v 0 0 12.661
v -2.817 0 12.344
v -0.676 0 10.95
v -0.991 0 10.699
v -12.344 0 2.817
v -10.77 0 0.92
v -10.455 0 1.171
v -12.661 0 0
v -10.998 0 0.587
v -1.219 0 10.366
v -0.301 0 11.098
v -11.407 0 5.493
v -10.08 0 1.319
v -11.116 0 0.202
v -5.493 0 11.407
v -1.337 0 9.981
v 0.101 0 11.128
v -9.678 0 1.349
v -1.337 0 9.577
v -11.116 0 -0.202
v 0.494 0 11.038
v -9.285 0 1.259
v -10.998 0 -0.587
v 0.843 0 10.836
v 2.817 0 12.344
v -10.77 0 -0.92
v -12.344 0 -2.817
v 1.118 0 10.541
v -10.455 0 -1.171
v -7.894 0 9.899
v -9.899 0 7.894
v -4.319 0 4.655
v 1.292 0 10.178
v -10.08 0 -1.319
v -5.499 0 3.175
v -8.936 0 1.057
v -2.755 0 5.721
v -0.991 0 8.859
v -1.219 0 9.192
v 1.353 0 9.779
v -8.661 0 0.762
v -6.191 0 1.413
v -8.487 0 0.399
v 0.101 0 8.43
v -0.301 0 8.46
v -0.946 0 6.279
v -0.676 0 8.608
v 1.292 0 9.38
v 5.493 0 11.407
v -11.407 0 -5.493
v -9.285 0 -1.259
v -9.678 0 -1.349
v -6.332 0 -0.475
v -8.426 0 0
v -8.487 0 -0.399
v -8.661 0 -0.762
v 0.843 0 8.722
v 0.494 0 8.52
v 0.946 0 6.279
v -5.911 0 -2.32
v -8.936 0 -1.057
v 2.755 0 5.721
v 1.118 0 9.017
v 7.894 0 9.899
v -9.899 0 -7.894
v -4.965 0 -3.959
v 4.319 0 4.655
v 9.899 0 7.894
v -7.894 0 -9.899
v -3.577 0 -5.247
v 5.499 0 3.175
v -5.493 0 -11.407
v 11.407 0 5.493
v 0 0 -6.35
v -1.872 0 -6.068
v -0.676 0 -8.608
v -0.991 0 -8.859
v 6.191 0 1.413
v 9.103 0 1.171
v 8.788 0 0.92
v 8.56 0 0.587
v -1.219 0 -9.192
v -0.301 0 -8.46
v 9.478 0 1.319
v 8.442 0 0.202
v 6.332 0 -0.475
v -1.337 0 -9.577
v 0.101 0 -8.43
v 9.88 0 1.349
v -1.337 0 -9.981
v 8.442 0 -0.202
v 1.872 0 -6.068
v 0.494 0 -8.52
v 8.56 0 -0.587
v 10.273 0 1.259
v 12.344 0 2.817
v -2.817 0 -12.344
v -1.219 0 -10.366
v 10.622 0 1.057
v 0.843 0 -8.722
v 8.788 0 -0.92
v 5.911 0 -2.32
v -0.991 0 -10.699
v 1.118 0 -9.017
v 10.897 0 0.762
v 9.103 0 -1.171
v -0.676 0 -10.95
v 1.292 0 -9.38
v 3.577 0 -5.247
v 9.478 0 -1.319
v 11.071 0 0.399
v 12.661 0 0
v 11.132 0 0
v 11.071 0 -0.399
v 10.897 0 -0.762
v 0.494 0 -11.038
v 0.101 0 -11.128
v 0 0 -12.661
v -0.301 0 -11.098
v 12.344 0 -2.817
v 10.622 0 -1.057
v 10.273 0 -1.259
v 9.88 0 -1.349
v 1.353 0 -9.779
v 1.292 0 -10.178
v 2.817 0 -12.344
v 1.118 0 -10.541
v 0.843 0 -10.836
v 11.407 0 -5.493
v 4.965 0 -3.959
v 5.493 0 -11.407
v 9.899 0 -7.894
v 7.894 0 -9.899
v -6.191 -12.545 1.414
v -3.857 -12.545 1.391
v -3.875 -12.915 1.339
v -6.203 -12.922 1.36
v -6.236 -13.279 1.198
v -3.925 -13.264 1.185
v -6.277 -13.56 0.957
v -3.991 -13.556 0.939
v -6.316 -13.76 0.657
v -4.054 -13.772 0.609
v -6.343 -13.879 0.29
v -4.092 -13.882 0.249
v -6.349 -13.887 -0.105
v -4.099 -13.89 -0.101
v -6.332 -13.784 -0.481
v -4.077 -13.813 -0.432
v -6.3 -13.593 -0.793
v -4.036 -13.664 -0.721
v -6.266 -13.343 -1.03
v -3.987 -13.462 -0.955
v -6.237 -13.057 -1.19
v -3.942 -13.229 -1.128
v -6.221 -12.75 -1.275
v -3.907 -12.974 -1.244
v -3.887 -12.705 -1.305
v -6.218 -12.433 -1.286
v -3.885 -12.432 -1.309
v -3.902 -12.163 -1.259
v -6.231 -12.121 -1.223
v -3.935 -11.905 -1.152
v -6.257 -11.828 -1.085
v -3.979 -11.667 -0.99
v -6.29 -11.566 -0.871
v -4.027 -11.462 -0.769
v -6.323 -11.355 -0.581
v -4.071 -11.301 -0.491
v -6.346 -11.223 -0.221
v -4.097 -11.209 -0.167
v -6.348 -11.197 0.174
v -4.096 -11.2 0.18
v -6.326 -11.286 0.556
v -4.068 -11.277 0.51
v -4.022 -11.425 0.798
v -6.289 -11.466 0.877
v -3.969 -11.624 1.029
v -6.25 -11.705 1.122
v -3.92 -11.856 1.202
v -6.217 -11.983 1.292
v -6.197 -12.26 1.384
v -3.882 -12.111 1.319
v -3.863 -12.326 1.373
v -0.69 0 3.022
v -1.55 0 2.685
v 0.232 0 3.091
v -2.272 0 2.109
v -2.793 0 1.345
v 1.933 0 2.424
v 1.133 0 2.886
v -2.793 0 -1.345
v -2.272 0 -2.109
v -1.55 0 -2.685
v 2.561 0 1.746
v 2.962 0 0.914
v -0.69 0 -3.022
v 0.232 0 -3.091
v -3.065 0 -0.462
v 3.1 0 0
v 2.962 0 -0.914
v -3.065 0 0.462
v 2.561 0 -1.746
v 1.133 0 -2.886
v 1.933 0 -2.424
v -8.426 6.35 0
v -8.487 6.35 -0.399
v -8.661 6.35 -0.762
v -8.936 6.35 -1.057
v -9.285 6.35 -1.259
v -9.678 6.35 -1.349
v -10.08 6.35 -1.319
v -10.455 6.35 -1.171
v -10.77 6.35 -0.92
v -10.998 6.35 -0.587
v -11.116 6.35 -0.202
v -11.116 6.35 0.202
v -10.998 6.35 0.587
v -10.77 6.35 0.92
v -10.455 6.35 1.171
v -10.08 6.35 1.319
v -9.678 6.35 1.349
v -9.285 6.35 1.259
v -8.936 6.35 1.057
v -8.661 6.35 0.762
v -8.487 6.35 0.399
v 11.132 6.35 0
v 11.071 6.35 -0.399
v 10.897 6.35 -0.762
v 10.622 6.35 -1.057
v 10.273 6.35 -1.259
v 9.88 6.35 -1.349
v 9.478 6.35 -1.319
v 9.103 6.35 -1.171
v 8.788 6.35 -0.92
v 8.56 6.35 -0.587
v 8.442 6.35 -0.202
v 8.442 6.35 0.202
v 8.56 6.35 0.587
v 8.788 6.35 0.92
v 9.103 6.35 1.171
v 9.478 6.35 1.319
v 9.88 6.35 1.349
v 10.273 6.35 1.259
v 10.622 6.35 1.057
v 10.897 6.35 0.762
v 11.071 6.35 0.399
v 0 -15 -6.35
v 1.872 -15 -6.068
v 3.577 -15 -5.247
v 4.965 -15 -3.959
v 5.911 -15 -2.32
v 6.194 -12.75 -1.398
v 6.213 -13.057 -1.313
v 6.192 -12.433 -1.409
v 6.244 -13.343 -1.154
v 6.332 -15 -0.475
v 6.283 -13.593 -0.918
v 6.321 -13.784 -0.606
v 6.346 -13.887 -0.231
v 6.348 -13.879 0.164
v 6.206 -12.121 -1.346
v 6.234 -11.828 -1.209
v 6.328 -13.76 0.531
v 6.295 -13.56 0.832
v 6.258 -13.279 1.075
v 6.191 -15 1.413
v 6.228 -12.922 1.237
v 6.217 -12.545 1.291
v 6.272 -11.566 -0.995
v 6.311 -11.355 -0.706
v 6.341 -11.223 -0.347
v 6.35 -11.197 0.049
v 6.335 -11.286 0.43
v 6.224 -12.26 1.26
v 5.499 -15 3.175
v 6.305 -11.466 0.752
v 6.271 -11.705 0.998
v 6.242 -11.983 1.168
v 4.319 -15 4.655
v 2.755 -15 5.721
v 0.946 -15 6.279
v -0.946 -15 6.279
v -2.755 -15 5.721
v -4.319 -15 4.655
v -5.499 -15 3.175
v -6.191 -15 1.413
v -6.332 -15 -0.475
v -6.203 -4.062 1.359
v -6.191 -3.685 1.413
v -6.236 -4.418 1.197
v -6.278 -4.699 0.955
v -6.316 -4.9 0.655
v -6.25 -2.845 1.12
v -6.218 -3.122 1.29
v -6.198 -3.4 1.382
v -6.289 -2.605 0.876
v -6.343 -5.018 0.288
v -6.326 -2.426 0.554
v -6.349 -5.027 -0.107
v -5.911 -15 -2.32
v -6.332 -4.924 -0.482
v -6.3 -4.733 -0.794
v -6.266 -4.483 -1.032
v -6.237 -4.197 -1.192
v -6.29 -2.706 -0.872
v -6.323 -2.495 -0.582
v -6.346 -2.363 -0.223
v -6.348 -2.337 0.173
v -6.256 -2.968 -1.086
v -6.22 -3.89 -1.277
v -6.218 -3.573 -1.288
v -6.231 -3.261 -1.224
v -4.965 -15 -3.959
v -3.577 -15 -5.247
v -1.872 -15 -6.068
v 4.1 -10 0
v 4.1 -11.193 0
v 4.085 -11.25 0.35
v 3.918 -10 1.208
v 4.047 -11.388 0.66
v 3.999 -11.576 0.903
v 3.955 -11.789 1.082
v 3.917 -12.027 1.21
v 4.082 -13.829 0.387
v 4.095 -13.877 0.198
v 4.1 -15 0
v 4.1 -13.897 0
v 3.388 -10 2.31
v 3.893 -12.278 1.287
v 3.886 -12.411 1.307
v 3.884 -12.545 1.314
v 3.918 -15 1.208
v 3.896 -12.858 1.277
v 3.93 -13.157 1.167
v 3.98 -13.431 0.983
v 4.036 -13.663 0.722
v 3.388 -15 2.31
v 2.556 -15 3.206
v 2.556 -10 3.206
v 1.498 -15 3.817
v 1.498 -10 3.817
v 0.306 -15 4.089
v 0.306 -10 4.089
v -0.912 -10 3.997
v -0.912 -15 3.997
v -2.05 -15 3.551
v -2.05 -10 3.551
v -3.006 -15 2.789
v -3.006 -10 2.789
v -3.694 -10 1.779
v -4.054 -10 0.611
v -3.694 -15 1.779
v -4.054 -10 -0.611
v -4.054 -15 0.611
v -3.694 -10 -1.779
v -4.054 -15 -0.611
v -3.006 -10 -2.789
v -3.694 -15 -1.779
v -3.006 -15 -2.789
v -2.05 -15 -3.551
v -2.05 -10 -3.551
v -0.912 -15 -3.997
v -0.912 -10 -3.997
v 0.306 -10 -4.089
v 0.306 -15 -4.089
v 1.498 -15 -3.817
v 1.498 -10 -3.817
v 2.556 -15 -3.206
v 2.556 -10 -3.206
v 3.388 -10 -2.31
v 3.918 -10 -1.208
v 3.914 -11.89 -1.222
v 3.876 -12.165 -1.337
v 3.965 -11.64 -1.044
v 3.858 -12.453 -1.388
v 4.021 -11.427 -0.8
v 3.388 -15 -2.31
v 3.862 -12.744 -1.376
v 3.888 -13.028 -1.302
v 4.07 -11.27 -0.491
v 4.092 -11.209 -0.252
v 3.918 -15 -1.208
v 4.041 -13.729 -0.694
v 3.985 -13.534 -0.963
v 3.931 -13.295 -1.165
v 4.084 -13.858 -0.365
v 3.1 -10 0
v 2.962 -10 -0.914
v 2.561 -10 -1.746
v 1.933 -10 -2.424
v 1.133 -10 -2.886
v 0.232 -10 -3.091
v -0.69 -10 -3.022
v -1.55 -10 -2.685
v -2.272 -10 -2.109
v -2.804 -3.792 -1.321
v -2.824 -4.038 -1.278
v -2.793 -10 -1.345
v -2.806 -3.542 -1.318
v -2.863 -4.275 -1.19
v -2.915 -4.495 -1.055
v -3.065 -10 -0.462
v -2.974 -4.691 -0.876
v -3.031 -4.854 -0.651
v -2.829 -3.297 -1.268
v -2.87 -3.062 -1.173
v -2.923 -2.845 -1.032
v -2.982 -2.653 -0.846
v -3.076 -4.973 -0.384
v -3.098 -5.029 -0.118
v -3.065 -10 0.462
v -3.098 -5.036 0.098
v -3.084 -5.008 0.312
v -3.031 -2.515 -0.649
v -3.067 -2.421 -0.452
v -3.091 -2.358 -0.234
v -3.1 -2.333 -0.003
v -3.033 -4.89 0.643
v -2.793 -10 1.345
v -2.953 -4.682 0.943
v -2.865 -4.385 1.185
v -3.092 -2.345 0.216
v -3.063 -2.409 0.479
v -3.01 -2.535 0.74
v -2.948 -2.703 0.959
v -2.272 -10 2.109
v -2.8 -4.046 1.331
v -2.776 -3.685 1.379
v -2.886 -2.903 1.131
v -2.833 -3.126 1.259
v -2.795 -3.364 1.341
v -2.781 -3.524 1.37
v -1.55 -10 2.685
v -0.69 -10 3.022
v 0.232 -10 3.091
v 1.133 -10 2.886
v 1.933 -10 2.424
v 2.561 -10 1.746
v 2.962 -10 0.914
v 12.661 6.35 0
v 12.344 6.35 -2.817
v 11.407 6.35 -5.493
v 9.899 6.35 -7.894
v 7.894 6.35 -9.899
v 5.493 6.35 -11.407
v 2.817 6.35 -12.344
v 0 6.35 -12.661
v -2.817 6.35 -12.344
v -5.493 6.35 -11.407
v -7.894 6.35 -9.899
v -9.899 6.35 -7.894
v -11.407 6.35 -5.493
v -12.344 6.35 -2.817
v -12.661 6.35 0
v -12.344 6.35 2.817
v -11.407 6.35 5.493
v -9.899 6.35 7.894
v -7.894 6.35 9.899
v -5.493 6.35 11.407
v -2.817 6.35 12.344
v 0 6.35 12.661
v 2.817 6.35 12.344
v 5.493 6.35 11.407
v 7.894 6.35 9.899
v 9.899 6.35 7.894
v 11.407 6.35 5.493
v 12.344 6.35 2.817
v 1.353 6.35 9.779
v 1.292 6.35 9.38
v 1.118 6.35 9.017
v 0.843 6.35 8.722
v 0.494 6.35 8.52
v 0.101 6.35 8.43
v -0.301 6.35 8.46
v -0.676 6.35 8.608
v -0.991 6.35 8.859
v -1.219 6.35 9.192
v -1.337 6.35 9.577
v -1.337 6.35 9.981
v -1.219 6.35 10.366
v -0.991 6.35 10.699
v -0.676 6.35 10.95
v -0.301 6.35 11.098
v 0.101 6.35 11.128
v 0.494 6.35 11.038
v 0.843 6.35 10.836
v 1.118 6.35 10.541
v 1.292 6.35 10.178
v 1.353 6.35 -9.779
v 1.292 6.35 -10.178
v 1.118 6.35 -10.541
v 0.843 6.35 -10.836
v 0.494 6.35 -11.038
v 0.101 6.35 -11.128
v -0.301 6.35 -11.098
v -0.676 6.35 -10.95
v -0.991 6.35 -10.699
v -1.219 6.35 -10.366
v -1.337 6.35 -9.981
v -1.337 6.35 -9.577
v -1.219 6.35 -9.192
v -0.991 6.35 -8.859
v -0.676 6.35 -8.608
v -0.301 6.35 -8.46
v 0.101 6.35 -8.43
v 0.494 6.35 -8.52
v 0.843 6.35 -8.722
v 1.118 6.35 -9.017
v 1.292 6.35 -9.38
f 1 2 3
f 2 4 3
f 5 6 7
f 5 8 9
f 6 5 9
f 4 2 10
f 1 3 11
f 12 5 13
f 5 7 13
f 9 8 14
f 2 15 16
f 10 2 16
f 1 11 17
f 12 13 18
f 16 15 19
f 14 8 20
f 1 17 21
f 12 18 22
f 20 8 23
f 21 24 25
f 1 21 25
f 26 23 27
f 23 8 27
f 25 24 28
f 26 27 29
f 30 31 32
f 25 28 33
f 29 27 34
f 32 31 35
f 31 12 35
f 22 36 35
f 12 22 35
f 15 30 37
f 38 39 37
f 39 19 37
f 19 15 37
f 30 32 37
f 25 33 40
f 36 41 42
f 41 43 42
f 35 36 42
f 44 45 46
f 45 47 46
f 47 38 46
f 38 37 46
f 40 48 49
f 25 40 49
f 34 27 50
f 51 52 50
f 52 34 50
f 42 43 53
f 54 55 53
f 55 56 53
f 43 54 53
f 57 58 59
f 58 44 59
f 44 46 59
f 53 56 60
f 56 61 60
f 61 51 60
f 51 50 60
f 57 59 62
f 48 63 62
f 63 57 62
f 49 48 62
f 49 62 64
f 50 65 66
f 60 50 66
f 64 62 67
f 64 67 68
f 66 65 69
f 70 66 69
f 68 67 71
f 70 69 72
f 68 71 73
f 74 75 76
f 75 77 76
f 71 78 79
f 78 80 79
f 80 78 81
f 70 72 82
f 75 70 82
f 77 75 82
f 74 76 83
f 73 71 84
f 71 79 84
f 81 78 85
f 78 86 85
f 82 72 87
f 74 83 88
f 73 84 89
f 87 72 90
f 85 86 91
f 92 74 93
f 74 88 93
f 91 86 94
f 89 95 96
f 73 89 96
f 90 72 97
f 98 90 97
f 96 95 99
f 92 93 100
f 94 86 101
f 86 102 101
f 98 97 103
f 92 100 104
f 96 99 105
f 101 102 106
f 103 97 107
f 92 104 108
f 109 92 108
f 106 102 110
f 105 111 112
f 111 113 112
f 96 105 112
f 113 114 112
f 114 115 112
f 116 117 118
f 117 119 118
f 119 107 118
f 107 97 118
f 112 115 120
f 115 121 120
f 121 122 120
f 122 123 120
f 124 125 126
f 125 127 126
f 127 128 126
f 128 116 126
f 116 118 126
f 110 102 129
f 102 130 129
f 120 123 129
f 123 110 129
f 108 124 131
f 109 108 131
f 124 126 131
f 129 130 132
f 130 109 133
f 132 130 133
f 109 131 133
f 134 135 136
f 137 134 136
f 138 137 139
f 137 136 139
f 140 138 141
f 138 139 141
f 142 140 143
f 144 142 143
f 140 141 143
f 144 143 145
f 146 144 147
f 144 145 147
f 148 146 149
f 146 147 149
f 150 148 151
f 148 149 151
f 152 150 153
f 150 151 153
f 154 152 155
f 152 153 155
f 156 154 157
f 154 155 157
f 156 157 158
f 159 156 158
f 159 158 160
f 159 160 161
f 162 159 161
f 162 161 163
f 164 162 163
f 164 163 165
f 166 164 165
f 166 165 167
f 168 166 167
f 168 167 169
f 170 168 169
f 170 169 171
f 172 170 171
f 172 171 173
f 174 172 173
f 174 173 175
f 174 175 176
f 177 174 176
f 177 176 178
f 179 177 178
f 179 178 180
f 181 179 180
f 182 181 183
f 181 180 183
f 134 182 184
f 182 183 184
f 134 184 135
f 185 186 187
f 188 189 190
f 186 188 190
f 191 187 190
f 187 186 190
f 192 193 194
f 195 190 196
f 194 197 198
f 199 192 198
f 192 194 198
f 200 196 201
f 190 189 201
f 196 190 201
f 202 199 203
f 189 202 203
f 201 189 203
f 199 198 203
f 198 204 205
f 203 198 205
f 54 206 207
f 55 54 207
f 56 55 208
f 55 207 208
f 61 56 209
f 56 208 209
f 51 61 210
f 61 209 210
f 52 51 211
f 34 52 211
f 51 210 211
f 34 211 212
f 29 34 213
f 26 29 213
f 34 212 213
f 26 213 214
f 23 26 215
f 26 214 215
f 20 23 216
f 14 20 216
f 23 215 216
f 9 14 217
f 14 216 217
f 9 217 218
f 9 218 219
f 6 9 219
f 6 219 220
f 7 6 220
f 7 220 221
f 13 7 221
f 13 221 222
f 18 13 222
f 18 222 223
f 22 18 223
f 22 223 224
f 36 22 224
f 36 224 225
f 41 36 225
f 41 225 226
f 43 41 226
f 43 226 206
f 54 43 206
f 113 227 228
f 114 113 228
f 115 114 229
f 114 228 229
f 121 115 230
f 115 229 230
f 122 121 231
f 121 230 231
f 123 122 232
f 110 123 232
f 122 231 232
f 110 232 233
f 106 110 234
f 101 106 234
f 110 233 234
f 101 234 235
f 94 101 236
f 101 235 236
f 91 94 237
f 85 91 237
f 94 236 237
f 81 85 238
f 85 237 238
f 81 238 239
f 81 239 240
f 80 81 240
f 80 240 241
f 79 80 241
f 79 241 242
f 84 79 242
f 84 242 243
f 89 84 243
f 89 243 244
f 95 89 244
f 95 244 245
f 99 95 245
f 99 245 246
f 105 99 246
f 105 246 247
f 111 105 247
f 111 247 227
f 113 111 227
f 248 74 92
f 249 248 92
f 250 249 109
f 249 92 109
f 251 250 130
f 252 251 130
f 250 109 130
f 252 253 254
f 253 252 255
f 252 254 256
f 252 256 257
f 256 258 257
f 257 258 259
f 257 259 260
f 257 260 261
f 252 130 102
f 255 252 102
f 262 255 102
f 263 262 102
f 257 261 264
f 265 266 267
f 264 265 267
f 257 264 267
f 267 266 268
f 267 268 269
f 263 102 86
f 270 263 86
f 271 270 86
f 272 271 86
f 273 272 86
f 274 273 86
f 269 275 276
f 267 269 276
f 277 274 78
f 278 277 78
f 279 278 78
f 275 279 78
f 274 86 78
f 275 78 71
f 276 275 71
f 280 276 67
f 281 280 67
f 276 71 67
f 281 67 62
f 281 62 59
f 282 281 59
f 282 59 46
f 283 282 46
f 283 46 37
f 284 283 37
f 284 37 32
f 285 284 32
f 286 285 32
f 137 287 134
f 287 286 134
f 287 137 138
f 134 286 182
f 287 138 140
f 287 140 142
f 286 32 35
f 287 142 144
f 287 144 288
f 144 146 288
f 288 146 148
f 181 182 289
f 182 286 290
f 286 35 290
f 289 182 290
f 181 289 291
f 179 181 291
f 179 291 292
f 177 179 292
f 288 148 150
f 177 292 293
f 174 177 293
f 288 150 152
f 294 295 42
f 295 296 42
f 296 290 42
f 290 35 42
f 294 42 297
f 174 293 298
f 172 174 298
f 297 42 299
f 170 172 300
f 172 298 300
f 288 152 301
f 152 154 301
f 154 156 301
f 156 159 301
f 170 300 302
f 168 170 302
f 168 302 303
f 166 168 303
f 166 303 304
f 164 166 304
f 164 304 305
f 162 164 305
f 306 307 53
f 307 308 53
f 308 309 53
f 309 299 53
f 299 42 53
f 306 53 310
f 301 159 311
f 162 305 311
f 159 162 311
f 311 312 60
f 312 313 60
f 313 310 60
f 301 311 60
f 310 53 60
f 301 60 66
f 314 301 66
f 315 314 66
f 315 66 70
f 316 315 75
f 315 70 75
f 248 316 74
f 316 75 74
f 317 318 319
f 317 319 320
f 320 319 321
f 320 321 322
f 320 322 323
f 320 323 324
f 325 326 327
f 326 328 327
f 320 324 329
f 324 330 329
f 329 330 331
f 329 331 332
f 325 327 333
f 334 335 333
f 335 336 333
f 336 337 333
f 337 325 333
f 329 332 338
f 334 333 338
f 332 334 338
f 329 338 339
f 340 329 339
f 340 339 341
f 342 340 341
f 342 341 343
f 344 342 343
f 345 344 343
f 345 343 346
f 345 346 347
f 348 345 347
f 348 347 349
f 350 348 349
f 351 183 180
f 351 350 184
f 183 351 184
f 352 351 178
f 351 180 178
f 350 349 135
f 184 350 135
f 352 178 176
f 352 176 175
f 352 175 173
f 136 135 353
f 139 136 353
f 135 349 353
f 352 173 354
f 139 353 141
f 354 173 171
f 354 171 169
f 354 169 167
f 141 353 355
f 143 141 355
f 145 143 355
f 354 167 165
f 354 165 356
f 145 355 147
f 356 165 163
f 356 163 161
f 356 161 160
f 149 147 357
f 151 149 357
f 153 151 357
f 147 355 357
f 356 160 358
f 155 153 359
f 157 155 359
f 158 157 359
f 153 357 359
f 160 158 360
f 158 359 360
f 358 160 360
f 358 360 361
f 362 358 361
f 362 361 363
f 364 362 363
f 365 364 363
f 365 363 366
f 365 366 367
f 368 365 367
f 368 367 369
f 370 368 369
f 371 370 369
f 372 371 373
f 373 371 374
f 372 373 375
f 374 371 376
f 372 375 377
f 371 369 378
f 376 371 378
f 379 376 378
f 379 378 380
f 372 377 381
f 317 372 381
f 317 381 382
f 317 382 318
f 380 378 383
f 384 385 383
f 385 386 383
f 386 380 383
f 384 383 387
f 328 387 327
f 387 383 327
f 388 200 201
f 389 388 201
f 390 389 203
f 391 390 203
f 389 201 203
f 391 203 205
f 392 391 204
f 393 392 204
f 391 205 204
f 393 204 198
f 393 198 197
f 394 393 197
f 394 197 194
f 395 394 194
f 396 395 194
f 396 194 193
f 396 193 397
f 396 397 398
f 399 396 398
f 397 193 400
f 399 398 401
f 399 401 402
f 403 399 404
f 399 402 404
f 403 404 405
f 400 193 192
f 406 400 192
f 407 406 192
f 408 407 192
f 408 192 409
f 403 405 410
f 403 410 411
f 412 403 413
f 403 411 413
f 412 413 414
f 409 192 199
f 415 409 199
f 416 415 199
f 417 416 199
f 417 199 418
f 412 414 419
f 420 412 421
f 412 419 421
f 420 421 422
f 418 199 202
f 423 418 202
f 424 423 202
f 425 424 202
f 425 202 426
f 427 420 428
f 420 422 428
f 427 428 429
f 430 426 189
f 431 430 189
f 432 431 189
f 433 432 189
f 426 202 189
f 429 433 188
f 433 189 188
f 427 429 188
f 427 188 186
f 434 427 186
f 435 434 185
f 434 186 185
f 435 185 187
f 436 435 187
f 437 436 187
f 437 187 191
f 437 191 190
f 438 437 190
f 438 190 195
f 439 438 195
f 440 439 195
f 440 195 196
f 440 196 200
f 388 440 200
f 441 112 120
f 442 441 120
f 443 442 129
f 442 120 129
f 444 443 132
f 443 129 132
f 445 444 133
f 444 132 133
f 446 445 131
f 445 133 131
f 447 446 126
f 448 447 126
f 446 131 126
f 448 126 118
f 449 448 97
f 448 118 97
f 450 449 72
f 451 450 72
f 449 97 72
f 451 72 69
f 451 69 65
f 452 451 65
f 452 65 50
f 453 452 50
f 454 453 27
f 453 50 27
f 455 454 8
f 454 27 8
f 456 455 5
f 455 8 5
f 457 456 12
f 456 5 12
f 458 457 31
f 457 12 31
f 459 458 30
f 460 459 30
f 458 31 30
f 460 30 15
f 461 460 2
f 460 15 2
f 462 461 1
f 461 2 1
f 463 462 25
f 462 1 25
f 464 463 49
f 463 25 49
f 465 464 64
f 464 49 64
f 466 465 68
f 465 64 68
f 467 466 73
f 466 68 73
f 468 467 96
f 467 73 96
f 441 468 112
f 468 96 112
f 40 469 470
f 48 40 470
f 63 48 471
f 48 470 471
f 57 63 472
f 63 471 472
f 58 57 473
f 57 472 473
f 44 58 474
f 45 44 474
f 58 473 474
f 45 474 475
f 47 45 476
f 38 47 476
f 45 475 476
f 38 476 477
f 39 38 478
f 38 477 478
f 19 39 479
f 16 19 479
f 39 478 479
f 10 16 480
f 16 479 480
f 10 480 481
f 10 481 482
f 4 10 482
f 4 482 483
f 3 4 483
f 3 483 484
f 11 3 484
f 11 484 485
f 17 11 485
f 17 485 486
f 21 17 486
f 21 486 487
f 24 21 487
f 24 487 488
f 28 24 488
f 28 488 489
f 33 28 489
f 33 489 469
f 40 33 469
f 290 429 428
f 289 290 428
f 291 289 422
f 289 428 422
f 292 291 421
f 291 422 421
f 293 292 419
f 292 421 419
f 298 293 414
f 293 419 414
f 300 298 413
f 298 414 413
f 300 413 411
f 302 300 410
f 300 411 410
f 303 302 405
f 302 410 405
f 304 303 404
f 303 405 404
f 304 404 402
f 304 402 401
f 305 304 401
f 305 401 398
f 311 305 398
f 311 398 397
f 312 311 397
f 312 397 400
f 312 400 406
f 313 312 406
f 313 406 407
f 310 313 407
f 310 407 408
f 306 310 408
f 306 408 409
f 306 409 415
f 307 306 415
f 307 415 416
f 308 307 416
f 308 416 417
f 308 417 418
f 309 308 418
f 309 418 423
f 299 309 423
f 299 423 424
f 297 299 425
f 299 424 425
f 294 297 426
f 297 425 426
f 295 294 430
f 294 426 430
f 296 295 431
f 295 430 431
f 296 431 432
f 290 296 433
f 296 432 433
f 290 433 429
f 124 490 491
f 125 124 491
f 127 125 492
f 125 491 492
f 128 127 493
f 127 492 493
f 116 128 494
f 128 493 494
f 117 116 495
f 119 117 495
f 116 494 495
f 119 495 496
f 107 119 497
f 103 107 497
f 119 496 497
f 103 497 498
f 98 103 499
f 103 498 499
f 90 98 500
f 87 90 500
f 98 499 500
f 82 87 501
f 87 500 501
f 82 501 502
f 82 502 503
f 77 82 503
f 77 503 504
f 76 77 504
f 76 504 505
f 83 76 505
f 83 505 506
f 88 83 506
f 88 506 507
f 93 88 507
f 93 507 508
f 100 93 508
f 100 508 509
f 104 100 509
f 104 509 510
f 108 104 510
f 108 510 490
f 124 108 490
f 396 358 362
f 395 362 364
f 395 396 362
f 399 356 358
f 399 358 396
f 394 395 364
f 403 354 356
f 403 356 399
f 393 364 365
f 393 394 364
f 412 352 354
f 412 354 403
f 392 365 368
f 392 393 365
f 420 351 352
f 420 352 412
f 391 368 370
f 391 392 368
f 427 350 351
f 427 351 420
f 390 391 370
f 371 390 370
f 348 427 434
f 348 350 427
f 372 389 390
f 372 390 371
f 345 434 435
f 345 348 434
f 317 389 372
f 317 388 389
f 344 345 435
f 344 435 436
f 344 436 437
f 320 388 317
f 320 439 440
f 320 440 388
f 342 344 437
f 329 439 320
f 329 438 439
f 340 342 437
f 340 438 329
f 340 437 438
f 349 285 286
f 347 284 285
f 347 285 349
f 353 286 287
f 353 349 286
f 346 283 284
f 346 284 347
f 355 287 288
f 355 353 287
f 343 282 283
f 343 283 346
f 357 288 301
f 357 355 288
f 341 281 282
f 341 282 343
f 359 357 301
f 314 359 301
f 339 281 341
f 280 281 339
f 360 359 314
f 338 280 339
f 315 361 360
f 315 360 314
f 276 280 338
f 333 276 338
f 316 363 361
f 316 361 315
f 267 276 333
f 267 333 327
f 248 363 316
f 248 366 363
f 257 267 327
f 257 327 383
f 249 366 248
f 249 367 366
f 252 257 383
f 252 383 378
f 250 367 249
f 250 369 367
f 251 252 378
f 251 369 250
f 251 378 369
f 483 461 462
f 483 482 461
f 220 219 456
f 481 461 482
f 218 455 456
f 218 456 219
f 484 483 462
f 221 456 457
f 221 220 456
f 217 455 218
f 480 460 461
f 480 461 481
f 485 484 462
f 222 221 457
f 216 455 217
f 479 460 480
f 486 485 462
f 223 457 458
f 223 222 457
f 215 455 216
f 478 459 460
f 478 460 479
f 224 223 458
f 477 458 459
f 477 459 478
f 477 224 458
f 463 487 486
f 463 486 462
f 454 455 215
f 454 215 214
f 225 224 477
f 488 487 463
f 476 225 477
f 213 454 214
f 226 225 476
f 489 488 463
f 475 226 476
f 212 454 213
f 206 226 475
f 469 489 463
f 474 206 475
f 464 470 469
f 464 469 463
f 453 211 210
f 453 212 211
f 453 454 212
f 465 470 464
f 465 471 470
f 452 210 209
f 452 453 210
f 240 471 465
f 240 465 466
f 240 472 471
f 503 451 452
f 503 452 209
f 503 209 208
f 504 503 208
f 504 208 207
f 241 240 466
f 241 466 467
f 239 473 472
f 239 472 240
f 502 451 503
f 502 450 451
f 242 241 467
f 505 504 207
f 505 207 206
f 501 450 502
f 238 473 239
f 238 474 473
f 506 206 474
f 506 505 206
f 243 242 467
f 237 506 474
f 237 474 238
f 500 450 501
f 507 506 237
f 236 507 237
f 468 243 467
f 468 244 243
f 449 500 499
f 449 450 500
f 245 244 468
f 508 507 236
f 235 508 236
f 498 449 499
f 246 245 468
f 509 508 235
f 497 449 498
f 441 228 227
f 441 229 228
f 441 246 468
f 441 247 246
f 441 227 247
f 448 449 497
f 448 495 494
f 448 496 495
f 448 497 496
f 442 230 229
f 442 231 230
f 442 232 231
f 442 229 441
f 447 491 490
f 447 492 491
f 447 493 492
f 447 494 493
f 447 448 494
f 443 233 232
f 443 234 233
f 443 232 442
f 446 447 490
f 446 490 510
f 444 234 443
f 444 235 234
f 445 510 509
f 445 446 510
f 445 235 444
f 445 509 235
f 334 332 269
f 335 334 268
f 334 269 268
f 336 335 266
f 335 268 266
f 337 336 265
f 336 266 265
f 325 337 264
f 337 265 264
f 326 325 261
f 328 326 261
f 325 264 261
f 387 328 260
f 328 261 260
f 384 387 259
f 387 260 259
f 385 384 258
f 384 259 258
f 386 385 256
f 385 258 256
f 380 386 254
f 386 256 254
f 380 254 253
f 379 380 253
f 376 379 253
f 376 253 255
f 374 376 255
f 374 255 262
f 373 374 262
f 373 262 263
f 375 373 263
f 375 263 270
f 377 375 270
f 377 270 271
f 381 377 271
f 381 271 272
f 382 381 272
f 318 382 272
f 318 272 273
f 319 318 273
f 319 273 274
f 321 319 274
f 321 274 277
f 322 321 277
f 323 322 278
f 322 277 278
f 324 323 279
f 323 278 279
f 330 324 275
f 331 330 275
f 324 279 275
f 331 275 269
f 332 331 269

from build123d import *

# Parameters (mm, degrees)
SKETCH1_R                 = 6.35
BOSS_EXTRUDE1_DEPTH       = 15
SKETCH2_R                 = 3.1
CUT_EXTRUDE1_DEPTH        = 10
SKETCH3_R                 = 4.1
CUT_EXTRUDE2_DEPTH        = 5
F_6_32_TAPPED_HOLE1_D     = 2.7051
F_6_32_TAPPED_HOLE1_DEPTH = 7
F_6_32_TAPPED_HOLE1_TIP   = 0.81269403
F_6_32_TAPPED_HOLE2_D     = 2.7051
SKETCH14_R                = 12.660953714
BOSS_EXTRUDE2_DEPTH       = 6.35
F_6_32_TAPPED_HOLE3_D     = 2.7051


with BuildPart() as part:
    # Sketch1 → Boss-Extrude1 (new body)
    with BuildSketch(Plane(origin=(0, 0, 0), x_dir=(0, 0, -1), z_dir=(0, -1, 0))):
        Circle(SKETCH1_R)
    extrude(amount=BOSS_EXTRUDE1_DEPTH)

    # Sketch2 → Cut-Extrude1 (cut)
    with BuildSketch(Plane(origin=(0, 0, 0), x_dir=(1, 0, 0), z_dir=(0, 1, 0))):
        Circle(SKETCH2_R)
    extrude(amount=-CUT_EXTRUDE1_DEPTH, mode=Mode.SUBTRACT)

    # Sketch3 → Cut-Extrude2 (cut)
    with BuildSketch(Plane.XZ.offset(15)):
        Circle(SKETCH3_R)
    extrude(amount=-CUT_EXTRUDE2_DEPTH, mode=Mode.SUBTRACT)

    # #6-32 Tapped Hole1
    with Locations(Plane(origin=(-6.349702391, -3.685069286, 0.061478042), x_dir=(-0.009681581, 0, -0.999953132), z_dir=(-0.999953132, 0, 0.009681581))):
        with Locations((0, 0)):
            Hole(F_6_32_TAPPED_HOLE1_D / 2, depth=F_6_32_TAPPED_HOLE1_DEPTH)
            with Locations((0, 0, -(F_6_32_TAPPED_HOLE1_DEPTH + F_6_32_TAPPED_HOLE1_TIP / 2))):  # 118° drill point
                Cone(0, F_6_32_TAPPED_HOLE1_D / 2, F_6_32_TAPPED_HOLE1_TIP, mode=Mode.SUBTRACT)

    # #6-32 Tapped Hole2 (through all)
    with Locations(Plane(origin=(-6.349688123, -12.545322132, 0.062934409), x_dir=(-0.009910931, 0, -0.999950886), z_dir=(-0.999950886, 0, 0.009910931))):
        with Locations((0, 0)):
            Hole(F_6_32_TAPPED_HOLE2_D / 2)

    # Sketch14 → Boss-Extrude2 (add)
    with BuildSketch(Plane(origin=(0, 0, 0), x_dir=(1, 0, 0), z_dir=(0, 1, 0))):
        Circle(SKETCH14_R)
    extrude(amount=BOSS_EXTRUDE2_DEPTH)

    # #6-32 Tapped Hole3 (through all)
    with Locations(Plane(origin=(0, 0, 0), x_dir=(-1, 0, 0), z_dir=(0, -1, 0))):
        with Locations((-9.779, 0), (0, 9.779), (9.779, 0), (0, -9.779)):
            Hole(F_6_32_TAPPED_HOLE3_D / 2)


solid = part.part
